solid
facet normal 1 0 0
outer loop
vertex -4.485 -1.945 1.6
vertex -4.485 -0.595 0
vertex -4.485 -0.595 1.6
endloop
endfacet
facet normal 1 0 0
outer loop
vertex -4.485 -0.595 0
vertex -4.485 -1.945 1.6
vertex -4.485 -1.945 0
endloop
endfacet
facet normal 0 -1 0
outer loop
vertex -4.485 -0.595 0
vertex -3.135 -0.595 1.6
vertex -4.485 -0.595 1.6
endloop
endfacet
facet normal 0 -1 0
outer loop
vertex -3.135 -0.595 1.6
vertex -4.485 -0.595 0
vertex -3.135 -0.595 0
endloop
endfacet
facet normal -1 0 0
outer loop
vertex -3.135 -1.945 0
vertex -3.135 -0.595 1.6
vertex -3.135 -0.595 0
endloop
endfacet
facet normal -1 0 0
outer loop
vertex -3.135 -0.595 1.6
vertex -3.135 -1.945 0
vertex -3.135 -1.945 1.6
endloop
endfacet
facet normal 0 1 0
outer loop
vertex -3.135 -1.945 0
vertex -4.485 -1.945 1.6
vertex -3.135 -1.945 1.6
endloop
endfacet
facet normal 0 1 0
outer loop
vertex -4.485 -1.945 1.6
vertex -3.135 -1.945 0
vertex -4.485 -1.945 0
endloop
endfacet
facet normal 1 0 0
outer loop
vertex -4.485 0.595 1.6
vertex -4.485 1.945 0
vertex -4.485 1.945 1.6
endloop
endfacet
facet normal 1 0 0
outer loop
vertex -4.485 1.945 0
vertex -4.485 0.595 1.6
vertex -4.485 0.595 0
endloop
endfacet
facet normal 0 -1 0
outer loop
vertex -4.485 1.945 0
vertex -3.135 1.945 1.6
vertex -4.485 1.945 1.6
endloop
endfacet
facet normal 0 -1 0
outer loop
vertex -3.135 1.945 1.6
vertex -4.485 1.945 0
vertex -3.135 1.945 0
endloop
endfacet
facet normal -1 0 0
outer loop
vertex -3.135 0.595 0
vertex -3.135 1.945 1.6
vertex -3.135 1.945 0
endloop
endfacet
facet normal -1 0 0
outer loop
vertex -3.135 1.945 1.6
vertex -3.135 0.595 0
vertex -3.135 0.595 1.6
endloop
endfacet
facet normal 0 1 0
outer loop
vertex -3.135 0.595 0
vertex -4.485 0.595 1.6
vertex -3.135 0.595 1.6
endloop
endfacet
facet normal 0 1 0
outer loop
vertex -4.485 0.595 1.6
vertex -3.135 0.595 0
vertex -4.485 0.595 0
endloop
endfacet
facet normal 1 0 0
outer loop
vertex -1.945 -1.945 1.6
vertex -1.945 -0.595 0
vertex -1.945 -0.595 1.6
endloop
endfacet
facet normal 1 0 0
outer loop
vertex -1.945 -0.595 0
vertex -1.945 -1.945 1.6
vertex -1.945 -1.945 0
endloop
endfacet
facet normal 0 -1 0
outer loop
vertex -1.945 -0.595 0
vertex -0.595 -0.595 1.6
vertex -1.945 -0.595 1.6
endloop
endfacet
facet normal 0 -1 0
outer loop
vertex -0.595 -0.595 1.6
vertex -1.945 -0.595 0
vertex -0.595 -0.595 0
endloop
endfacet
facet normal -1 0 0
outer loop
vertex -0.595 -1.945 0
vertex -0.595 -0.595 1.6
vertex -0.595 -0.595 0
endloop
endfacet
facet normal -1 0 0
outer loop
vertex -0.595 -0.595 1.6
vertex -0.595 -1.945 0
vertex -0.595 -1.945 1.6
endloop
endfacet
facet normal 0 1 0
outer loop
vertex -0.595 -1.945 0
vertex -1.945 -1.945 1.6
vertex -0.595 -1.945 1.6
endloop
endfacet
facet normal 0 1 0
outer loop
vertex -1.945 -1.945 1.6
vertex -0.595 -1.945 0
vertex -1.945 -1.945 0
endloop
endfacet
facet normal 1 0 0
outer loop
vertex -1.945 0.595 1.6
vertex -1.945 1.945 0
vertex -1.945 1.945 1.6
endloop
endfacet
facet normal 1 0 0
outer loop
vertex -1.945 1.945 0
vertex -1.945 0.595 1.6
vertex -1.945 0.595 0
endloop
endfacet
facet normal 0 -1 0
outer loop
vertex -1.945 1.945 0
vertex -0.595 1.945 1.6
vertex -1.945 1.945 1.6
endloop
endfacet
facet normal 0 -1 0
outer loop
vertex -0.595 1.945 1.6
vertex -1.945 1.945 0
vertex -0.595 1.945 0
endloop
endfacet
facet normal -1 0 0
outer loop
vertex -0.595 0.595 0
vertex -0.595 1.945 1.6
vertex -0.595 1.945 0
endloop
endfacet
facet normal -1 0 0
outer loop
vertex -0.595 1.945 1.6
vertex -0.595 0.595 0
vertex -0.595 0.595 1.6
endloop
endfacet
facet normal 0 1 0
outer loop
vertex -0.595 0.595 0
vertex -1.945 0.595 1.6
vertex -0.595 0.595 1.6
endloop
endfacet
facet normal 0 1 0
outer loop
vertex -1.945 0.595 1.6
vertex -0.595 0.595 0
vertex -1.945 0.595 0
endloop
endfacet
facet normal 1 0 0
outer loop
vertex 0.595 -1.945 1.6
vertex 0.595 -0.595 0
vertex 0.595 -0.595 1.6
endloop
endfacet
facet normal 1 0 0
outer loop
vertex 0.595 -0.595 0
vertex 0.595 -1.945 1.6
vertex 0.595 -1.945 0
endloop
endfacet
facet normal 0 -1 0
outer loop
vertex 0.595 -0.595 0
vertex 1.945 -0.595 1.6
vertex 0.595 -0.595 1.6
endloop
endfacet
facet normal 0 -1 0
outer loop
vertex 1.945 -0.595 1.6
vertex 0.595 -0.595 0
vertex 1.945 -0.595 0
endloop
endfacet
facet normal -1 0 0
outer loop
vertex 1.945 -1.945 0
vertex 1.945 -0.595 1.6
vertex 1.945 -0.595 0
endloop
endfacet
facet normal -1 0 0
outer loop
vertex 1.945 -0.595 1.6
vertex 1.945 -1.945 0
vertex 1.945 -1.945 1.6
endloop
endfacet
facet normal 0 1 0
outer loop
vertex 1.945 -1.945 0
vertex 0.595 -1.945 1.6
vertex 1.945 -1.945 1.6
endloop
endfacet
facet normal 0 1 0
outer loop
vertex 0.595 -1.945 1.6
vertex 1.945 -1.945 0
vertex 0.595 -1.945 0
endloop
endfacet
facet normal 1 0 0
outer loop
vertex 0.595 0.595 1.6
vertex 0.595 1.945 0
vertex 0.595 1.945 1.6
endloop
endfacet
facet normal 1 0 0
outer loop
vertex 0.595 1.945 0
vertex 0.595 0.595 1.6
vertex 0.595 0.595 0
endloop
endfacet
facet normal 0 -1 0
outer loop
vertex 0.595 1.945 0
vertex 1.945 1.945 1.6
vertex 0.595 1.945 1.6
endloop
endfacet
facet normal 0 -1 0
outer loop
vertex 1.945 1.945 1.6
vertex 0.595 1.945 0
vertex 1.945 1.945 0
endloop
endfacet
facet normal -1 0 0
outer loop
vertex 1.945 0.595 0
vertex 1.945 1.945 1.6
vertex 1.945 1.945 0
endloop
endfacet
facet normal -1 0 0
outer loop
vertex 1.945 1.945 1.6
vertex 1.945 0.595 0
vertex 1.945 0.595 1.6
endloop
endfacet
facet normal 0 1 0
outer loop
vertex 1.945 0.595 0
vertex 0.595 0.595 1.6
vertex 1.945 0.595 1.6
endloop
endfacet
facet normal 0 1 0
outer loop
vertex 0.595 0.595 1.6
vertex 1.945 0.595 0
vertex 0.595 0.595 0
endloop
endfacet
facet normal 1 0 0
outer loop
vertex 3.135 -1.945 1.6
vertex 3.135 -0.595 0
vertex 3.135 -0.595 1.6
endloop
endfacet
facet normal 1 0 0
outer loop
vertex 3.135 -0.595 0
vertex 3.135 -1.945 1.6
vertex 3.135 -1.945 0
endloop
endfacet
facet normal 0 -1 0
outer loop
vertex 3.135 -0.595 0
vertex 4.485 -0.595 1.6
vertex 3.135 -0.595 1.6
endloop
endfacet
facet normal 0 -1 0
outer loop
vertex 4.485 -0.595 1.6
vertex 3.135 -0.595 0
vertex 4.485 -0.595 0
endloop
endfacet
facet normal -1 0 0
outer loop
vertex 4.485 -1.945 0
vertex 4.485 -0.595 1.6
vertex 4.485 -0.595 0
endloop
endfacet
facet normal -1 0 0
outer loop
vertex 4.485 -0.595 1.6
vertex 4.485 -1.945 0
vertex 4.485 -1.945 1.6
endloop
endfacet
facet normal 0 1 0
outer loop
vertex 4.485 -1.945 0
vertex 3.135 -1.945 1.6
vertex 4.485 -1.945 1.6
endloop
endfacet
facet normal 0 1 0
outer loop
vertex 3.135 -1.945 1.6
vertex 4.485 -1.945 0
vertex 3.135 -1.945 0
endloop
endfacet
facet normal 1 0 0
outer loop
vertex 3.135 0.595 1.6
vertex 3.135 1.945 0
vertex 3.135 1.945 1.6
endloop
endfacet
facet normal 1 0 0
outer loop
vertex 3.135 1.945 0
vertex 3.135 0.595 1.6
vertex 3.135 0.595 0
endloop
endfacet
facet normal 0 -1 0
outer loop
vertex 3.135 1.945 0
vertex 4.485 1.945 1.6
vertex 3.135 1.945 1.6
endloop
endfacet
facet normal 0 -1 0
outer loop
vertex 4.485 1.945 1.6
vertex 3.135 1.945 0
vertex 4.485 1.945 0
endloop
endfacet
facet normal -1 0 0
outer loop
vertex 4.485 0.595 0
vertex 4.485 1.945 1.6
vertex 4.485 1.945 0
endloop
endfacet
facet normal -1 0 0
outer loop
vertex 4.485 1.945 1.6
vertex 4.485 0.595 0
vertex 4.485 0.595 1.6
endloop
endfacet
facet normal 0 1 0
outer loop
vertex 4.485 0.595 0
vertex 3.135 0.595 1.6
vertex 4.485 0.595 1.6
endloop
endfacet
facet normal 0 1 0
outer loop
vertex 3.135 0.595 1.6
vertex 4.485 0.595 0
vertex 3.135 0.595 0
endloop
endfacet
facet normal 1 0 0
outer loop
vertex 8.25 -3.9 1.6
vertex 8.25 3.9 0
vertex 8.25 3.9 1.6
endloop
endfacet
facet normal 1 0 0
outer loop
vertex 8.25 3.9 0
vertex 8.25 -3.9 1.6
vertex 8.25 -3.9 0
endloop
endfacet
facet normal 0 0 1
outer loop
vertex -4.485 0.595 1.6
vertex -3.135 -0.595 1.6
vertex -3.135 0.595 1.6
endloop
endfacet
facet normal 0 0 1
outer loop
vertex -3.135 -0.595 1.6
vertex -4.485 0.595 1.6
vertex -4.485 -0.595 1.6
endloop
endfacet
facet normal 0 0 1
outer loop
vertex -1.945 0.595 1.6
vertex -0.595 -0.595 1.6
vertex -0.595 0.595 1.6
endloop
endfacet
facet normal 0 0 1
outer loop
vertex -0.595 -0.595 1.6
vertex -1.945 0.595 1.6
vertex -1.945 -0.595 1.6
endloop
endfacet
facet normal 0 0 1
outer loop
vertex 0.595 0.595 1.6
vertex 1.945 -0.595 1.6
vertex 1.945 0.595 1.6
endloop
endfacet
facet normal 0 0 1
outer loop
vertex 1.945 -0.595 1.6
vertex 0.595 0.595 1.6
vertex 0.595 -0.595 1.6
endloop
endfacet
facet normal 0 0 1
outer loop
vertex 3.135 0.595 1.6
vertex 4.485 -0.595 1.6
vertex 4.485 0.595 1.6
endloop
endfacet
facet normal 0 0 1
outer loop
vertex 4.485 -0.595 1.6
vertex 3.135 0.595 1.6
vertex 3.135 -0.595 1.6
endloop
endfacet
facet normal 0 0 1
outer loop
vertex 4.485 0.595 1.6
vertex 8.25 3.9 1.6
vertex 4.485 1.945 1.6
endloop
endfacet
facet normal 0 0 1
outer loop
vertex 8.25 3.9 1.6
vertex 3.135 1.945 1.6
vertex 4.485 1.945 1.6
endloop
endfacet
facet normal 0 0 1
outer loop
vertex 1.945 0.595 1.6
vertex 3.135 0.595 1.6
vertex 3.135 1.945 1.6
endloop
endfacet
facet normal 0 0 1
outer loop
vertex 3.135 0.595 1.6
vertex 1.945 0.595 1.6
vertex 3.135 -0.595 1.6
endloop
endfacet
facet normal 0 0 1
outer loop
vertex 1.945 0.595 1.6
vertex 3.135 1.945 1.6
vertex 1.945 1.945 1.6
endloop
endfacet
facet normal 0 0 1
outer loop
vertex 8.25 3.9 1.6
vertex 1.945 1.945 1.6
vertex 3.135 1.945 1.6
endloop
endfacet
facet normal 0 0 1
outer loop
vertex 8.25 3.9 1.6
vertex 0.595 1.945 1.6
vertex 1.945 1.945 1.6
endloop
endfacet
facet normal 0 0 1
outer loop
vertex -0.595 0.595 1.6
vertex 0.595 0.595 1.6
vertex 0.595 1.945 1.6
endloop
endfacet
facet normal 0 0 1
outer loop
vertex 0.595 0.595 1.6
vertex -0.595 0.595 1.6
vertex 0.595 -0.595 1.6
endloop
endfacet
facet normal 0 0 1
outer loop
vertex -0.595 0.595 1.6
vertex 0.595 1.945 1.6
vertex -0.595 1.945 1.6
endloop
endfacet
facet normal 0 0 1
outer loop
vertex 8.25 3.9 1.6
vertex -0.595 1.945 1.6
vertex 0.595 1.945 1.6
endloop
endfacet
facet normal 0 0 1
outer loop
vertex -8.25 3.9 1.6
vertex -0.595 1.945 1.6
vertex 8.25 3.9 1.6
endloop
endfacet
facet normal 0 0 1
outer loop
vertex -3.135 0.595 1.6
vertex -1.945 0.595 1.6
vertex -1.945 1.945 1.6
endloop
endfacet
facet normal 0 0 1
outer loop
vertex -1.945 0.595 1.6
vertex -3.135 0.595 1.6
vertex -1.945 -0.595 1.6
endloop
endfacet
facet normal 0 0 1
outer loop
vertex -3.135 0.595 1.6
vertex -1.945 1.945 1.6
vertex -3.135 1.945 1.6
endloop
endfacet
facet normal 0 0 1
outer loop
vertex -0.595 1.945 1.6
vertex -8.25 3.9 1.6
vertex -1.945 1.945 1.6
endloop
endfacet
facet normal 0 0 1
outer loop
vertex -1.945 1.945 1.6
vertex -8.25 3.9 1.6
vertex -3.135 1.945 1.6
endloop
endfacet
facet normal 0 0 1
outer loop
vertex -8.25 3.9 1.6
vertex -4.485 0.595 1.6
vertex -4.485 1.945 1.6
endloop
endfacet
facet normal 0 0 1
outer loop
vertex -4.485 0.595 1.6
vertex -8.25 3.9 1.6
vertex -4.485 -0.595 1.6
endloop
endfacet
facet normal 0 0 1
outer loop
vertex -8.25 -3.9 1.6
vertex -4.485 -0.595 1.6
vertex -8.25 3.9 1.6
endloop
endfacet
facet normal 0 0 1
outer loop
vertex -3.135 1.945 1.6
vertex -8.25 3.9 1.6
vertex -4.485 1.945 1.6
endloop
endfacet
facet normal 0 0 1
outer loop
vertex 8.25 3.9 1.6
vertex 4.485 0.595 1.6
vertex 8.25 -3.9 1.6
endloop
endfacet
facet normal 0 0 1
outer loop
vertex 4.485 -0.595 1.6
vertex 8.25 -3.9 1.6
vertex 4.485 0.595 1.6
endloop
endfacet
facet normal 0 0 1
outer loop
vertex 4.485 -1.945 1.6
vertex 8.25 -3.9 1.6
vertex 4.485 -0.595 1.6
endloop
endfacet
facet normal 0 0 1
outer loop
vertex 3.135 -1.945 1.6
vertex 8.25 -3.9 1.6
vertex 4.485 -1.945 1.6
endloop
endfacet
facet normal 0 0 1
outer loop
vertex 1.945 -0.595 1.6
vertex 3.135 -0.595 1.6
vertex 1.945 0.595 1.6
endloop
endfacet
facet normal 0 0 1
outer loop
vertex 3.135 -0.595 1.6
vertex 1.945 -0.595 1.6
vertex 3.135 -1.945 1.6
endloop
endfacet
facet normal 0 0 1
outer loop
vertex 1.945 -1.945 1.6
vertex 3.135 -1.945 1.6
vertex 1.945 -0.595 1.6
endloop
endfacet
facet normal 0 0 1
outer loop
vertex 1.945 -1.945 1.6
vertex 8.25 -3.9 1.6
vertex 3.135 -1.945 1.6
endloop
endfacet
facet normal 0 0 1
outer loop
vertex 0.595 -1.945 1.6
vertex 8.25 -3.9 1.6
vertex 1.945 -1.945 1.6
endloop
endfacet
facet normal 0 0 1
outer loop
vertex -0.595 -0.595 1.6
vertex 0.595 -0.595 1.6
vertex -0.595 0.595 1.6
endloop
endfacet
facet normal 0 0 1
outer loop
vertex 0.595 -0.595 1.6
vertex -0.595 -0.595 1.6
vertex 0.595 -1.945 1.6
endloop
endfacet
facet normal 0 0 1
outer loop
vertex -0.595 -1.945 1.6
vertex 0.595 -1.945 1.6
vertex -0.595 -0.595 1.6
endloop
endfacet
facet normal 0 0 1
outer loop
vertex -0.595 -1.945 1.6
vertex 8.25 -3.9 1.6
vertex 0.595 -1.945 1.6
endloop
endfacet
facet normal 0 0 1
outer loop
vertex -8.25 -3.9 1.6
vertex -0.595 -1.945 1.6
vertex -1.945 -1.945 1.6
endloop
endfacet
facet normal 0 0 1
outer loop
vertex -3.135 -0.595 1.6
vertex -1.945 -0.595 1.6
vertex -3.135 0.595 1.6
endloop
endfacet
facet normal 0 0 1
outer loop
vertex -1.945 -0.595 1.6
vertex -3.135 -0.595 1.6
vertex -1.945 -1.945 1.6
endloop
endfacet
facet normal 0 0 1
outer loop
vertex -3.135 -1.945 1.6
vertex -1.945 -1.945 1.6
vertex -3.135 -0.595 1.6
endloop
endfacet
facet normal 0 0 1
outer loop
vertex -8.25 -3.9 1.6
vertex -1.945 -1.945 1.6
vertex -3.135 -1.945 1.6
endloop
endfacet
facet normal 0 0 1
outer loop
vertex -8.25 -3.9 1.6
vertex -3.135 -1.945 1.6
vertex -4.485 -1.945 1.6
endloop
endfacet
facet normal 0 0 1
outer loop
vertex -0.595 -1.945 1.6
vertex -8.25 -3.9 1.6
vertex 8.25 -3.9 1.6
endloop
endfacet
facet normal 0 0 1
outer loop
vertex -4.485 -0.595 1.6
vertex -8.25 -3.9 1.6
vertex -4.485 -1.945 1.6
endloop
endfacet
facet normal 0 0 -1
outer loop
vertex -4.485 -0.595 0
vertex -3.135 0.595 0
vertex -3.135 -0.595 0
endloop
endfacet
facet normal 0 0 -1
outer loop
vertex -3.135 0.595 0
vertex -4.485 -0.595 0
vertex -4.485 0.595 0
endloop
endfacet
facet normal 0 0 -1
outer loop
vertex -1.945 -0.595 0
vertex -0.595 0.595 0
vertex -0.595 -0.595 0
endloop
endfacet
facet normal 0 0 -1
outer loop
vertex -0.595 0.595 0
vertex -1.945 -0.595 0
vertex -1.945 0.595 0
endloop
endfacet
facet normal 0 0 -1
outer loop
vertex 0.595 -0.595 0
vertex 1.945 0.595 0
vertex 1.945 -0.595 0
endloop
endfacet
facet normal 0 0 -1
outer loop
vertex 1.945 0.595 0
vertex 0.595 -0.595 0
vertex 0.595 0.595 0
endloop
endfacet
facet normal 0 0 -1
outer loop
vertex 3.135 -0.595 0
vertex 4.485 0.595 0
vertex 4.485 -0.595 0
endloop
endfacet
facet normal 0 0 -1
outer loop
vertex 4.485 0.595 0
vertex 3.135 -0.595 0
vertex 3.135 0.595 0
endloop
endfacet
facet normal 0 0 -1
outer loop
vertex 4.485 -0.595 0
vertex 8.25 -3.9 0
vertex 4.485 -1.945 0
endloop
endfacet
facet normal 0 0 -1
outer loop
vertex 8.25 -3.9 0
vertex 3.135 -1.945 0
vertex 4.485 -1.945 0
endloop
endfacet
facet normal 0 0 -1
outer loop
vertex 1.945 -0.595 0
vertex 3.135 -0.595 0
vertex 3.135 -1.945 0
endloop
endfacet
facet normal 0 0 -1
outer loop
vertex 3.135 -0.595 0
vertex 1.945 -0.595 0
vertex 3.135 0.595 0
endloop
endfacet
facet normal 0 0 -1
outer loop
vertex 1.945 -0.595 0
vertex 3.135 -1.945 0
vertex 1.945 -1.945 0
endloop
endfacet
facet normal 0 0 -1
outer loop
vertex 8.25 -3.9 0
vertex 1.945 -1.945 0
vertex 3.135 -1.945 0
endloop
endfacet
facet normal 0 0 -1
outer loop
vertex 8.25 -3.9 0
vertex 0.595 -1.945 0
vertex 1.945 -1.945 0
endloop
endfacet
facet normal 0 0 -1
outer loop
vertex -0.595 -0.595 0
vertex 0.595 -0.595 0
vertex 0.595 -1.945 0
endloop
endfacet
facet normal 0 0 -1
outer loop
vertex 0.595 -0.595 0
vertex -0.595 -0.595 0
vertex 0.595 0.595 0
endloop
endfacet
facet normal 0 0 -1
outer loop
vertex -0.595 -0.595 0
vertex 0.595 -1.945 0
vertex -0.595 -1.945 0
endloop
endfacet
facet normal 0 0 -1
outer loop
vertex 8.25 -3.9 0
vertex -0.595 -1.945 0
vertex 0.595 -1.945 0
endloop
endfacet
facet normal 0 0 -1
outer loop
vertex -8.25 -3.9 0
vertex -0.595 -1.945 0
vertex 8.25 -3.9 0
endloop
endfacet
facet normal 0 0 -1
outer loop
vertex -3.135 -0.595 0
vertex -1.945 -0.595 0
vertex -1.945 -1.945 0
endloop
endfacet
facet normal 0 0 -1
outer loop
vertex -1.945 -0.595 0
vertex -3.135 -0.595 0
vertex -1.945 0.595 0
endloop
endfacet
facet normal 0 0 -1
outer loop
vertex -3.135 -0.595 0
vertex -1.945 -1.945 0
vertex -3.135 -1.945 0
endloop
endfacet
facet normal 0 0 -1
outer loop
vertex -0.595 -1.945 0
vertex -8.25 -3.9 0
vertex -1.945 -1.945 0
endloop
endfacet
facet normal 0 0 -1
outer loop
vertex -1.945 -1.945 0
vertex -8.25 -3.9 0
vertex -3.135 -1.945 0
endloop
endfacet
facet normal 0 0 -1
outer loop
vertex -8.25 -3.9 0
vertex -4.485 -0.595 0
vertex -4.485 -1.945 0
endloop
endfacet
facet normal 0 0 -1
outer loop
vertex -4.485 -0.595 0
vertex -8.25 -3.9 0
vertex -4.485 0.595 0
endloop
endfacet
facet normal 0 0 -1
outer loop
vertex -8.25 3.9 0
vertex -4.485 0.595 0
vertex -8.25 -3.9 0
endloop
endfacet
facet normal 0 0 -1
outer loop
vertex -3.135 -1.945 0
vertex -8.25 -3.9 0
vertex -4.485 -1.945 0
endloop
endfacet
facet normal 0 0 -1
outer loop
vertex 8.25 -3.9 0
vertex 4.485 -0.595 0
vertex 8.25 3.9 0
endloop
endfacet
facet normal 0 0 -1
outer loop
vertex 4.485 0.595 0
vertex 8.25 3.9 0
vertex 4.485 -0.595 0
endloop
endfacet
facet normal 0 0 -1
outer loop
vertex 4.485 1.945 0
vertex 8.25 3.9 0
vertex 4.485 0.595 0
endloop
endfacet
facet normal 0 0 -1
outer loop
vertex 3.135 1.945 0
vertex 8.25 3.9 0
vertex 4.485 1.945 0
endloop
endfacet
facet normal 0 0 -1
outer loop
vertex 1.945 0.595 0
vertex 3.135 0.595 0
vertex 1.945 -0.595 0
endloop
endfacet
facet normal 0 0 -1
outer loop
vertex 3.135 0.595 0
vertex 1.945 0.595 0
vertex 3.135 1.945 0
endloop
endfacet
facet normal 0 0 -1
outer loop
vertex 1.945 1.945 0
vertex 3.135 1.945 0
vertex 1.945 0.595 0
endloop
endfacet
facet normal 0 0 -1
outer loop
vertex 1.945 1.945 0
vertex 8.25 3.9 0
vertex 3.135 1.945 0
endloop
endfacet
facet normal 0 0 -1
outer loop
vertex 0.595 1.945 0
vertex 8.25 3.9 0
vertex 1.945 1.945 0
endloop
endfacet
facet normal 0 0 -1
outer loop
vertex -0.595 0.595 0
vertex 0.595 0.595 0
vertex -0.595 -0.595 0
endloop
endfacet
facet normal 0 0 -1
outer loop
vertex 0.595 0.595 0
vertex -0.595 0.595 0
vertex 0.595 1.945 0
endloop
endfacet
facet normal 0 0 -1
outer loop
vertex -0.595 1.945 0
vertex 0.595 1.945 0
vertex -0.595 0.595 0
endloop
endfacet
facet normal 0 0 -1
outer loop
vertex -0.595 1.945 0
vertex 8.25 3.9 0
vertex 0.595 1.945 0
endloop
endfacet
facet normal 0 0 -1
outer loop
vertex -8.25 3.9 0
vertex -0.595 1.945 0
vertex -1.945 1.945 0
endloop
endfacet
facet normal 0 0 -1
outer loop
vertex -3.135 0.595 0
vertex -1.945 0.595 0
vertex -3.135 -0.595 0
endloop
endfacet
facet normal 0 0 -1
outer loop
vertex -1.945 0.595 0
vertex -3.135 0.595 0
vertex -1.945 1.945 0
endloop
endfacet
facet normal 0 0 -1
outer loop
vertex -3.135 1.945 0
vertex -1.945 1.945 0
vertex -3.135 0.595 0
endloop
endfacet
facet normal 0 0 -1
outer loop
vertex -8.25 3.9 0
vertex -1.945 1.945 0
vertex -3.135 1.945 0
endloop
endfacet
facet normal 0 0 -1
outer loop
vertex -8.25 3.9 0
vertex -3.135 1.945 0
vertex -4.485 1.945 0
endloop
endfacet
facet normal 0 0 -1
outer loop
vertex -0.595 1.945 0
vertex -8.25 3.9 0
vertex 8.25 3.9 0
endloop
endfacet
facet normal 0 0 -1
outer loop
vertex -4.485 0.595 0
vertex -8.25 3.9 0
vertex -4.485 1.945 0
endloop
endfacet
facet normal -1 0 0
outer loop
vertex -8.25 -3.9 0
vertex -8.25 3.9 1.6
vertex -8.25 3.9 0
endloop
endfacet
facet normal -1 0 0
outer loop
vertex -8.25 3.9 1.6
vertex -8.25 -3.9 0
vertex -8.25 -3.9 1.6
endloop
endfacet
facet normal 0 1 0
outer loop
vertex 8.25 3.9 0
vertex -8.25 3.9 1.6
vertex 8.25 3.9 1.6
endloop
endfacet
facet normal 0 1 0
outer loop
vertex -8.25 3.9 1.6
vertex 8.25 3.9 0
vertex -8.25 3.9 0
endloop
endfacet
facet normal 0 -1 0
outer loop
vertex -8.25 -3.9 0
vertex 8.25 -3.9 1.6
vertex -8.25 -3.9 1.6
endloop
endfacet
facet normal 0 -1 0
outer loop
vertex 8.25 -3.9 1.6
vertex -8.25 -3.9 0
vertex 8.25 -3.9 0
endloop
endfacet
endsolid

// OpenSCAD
// BTS7960 / IBT-2 logic plug, first physical-fit prototype (millimetres).
//
// A standard one-piece 2x4, 2.54 mm PCB female header is soldered directly
// to five logic wires and trapped between two printed halves. No perfboard.
// This is NOT keyed yet. Do not use it on an energised motor until a matching
// driver-side key and the actual pinout have been verified.

$fn = 48;

part = "fit_gauge"; // [fit_gauge,lower,upper,assembly,exploded]

pitch = 2.54;
pin_hole = 1.35;          // test aperture; enlarge only if the gauge binds
front_lip = 1.60;         // printed material before the female header face

// Provisional outside envelope of a 2x4 female PCB header. Adjust from the
// first physical print; different header brands have different plastic bodies.
header_x = 13.00;          // user's approximate overall 2x4 body length
header_y = 4.50;           // user's approximate overall 2x4 body width
header_z = 8.50;
header_fit = 0.40;        // total diametral clearance, not per side

nose_x = 16.50;
nose_y = 7.80;
nose_z = front_lip + header_z + 1.00;

rear_x = 25.00;           // screw flanges are behind the driver-side nose
rear_y = 15.00;
rear_z = 18.00;
total_z = nose_z + rear_z;

solder_x = 14.00;
solder_y = 9.20;
solder_depth = 13.00;
cable_exit_d = 5.50;     // for a bundled, sleeved five-wire harness

screw_x = 9.00;
screw_z = nose_z + 7.00;
screw_clearance_d = 2.30; // two M2 through-bolts with nuts
nut_pocket_d = 4.90;     // hex circumscribed diameter; ~4.2 mm across flats
nut_pocket_depth = 2.30;

epsilon = 0.02;

module eight_pin_pattern(h=1, aperture=pin_hole) {
    for (col = [0:3], row = [0:1])
        translate([(col - 1.5)*pitch, (row - 0.5)*pitch, -epsilon])
            linear_extrude(height=h + 2*epsilon)
                square([aperture, aperture], center=true);
}

module fit_gauge() {
    difference() {
        translate([-nose_x/2, -nose_y/2, 0])
            cube([nose_x, nose_y, front_lip]);
        eight_pin_pattern(front_lip);
    }
}

module outside_shell() {
    union() {
        translate([-nose_x/2, -nose_y/2, 0])
            cube([nose_x, nose_y, nose_z]);
        translate([-rear_x/2, -rear_y/2, nose_z])
            cube([rear_x, rear_y, rear_z]);
    }
}

module cable_bore() {
    translate([0, 0, nose_z + solder_depth - epsilon])
        cylinder(d=cable_exit_d, h=rear_z - solder_depth + 2*epsilon);
}

module fastener_holes() {
    for (x = [-screw_x, screw_x]) {
        // A through-hole perpendicular to the split plane.
        translate([x, -rear_y/2 - epsilon, screw_z])
            rotate([-90, 0, 0])
                cylinder(d=screw_clearance_d, h=rear_y + 2*epsilon);
        // Captive nut recess in the outside face of the lower half.
        translate([x, -rear_y/2 - epsilon, screw_z])
            rotate([-90, 0, 0])
                cylinder(d=nut_pocket_d, h=nut_pocket_depth + epsilon,
                         $fn=6);
    }
}

module whole_shell() {
    difference() {
        outside_shell();

        // The header slides in from the cable side and stops at the front lip.
        translate([-(header_x + header_fit)/2,
                   -(header_y + header_fit)/2,
                   front_lip])
            cube([header_x + header_fit,
                  header_y + header_fit,
                  header_z + 1.10]);

        // Chamber for the solder tails, insulated joints and the EN bridge.
        translate([-solder_x/2, -solder_y/2, nose_z - epsilon])
            cube([solder_x, solder_y, solder_depth + 2*epsilon]);

        cable_bore();
        eight_pin_pattern(front_lip);
        fastener_holes();
    }
}

module lower_half() {
    intersection() {
        whole_shell();
        translate([-rear_x, -rear_y, -epsilon])
            cube([2*rear_x, rear_y, total_z + 2*epsilon]);
    }
}

module upper_half() {
    intersection() {
        whole_shell();
        translate([-rear_x, 0, -epsilon])
            cube([2*rear_x, rear_y, total_z + 2*epsilon]);
    }
}

if (part == "fit_gauge") fit_gauge();
// Exported halves sit on their split faces, ready for the slicer bed.
else if (part == "lower") rotate([-90, 0, 0]) lower_half();
else if (part == "upper") rotate([90, 0, 0]) upper_half();
else if (part == "assembly") {
    lower_half();
    color([0.40, 0.75, 0.85, 0.65]) upper_half();
} else if (part == "exploded") {
    color([0.40, 0.75, 0.85]) translate([0, 6, 0]) upper_half();
    color([0.45, 0.70, 0.45]) translate([0, -6, 0]) lower_half();
    // Reference volume only: the physical female header is not printed.
    %translate([-header_x/2, -header_y/2, front_lip])
        cube([header_x, header_y, header_z]);
} else assert(false, str("Unknown part: ", part));
